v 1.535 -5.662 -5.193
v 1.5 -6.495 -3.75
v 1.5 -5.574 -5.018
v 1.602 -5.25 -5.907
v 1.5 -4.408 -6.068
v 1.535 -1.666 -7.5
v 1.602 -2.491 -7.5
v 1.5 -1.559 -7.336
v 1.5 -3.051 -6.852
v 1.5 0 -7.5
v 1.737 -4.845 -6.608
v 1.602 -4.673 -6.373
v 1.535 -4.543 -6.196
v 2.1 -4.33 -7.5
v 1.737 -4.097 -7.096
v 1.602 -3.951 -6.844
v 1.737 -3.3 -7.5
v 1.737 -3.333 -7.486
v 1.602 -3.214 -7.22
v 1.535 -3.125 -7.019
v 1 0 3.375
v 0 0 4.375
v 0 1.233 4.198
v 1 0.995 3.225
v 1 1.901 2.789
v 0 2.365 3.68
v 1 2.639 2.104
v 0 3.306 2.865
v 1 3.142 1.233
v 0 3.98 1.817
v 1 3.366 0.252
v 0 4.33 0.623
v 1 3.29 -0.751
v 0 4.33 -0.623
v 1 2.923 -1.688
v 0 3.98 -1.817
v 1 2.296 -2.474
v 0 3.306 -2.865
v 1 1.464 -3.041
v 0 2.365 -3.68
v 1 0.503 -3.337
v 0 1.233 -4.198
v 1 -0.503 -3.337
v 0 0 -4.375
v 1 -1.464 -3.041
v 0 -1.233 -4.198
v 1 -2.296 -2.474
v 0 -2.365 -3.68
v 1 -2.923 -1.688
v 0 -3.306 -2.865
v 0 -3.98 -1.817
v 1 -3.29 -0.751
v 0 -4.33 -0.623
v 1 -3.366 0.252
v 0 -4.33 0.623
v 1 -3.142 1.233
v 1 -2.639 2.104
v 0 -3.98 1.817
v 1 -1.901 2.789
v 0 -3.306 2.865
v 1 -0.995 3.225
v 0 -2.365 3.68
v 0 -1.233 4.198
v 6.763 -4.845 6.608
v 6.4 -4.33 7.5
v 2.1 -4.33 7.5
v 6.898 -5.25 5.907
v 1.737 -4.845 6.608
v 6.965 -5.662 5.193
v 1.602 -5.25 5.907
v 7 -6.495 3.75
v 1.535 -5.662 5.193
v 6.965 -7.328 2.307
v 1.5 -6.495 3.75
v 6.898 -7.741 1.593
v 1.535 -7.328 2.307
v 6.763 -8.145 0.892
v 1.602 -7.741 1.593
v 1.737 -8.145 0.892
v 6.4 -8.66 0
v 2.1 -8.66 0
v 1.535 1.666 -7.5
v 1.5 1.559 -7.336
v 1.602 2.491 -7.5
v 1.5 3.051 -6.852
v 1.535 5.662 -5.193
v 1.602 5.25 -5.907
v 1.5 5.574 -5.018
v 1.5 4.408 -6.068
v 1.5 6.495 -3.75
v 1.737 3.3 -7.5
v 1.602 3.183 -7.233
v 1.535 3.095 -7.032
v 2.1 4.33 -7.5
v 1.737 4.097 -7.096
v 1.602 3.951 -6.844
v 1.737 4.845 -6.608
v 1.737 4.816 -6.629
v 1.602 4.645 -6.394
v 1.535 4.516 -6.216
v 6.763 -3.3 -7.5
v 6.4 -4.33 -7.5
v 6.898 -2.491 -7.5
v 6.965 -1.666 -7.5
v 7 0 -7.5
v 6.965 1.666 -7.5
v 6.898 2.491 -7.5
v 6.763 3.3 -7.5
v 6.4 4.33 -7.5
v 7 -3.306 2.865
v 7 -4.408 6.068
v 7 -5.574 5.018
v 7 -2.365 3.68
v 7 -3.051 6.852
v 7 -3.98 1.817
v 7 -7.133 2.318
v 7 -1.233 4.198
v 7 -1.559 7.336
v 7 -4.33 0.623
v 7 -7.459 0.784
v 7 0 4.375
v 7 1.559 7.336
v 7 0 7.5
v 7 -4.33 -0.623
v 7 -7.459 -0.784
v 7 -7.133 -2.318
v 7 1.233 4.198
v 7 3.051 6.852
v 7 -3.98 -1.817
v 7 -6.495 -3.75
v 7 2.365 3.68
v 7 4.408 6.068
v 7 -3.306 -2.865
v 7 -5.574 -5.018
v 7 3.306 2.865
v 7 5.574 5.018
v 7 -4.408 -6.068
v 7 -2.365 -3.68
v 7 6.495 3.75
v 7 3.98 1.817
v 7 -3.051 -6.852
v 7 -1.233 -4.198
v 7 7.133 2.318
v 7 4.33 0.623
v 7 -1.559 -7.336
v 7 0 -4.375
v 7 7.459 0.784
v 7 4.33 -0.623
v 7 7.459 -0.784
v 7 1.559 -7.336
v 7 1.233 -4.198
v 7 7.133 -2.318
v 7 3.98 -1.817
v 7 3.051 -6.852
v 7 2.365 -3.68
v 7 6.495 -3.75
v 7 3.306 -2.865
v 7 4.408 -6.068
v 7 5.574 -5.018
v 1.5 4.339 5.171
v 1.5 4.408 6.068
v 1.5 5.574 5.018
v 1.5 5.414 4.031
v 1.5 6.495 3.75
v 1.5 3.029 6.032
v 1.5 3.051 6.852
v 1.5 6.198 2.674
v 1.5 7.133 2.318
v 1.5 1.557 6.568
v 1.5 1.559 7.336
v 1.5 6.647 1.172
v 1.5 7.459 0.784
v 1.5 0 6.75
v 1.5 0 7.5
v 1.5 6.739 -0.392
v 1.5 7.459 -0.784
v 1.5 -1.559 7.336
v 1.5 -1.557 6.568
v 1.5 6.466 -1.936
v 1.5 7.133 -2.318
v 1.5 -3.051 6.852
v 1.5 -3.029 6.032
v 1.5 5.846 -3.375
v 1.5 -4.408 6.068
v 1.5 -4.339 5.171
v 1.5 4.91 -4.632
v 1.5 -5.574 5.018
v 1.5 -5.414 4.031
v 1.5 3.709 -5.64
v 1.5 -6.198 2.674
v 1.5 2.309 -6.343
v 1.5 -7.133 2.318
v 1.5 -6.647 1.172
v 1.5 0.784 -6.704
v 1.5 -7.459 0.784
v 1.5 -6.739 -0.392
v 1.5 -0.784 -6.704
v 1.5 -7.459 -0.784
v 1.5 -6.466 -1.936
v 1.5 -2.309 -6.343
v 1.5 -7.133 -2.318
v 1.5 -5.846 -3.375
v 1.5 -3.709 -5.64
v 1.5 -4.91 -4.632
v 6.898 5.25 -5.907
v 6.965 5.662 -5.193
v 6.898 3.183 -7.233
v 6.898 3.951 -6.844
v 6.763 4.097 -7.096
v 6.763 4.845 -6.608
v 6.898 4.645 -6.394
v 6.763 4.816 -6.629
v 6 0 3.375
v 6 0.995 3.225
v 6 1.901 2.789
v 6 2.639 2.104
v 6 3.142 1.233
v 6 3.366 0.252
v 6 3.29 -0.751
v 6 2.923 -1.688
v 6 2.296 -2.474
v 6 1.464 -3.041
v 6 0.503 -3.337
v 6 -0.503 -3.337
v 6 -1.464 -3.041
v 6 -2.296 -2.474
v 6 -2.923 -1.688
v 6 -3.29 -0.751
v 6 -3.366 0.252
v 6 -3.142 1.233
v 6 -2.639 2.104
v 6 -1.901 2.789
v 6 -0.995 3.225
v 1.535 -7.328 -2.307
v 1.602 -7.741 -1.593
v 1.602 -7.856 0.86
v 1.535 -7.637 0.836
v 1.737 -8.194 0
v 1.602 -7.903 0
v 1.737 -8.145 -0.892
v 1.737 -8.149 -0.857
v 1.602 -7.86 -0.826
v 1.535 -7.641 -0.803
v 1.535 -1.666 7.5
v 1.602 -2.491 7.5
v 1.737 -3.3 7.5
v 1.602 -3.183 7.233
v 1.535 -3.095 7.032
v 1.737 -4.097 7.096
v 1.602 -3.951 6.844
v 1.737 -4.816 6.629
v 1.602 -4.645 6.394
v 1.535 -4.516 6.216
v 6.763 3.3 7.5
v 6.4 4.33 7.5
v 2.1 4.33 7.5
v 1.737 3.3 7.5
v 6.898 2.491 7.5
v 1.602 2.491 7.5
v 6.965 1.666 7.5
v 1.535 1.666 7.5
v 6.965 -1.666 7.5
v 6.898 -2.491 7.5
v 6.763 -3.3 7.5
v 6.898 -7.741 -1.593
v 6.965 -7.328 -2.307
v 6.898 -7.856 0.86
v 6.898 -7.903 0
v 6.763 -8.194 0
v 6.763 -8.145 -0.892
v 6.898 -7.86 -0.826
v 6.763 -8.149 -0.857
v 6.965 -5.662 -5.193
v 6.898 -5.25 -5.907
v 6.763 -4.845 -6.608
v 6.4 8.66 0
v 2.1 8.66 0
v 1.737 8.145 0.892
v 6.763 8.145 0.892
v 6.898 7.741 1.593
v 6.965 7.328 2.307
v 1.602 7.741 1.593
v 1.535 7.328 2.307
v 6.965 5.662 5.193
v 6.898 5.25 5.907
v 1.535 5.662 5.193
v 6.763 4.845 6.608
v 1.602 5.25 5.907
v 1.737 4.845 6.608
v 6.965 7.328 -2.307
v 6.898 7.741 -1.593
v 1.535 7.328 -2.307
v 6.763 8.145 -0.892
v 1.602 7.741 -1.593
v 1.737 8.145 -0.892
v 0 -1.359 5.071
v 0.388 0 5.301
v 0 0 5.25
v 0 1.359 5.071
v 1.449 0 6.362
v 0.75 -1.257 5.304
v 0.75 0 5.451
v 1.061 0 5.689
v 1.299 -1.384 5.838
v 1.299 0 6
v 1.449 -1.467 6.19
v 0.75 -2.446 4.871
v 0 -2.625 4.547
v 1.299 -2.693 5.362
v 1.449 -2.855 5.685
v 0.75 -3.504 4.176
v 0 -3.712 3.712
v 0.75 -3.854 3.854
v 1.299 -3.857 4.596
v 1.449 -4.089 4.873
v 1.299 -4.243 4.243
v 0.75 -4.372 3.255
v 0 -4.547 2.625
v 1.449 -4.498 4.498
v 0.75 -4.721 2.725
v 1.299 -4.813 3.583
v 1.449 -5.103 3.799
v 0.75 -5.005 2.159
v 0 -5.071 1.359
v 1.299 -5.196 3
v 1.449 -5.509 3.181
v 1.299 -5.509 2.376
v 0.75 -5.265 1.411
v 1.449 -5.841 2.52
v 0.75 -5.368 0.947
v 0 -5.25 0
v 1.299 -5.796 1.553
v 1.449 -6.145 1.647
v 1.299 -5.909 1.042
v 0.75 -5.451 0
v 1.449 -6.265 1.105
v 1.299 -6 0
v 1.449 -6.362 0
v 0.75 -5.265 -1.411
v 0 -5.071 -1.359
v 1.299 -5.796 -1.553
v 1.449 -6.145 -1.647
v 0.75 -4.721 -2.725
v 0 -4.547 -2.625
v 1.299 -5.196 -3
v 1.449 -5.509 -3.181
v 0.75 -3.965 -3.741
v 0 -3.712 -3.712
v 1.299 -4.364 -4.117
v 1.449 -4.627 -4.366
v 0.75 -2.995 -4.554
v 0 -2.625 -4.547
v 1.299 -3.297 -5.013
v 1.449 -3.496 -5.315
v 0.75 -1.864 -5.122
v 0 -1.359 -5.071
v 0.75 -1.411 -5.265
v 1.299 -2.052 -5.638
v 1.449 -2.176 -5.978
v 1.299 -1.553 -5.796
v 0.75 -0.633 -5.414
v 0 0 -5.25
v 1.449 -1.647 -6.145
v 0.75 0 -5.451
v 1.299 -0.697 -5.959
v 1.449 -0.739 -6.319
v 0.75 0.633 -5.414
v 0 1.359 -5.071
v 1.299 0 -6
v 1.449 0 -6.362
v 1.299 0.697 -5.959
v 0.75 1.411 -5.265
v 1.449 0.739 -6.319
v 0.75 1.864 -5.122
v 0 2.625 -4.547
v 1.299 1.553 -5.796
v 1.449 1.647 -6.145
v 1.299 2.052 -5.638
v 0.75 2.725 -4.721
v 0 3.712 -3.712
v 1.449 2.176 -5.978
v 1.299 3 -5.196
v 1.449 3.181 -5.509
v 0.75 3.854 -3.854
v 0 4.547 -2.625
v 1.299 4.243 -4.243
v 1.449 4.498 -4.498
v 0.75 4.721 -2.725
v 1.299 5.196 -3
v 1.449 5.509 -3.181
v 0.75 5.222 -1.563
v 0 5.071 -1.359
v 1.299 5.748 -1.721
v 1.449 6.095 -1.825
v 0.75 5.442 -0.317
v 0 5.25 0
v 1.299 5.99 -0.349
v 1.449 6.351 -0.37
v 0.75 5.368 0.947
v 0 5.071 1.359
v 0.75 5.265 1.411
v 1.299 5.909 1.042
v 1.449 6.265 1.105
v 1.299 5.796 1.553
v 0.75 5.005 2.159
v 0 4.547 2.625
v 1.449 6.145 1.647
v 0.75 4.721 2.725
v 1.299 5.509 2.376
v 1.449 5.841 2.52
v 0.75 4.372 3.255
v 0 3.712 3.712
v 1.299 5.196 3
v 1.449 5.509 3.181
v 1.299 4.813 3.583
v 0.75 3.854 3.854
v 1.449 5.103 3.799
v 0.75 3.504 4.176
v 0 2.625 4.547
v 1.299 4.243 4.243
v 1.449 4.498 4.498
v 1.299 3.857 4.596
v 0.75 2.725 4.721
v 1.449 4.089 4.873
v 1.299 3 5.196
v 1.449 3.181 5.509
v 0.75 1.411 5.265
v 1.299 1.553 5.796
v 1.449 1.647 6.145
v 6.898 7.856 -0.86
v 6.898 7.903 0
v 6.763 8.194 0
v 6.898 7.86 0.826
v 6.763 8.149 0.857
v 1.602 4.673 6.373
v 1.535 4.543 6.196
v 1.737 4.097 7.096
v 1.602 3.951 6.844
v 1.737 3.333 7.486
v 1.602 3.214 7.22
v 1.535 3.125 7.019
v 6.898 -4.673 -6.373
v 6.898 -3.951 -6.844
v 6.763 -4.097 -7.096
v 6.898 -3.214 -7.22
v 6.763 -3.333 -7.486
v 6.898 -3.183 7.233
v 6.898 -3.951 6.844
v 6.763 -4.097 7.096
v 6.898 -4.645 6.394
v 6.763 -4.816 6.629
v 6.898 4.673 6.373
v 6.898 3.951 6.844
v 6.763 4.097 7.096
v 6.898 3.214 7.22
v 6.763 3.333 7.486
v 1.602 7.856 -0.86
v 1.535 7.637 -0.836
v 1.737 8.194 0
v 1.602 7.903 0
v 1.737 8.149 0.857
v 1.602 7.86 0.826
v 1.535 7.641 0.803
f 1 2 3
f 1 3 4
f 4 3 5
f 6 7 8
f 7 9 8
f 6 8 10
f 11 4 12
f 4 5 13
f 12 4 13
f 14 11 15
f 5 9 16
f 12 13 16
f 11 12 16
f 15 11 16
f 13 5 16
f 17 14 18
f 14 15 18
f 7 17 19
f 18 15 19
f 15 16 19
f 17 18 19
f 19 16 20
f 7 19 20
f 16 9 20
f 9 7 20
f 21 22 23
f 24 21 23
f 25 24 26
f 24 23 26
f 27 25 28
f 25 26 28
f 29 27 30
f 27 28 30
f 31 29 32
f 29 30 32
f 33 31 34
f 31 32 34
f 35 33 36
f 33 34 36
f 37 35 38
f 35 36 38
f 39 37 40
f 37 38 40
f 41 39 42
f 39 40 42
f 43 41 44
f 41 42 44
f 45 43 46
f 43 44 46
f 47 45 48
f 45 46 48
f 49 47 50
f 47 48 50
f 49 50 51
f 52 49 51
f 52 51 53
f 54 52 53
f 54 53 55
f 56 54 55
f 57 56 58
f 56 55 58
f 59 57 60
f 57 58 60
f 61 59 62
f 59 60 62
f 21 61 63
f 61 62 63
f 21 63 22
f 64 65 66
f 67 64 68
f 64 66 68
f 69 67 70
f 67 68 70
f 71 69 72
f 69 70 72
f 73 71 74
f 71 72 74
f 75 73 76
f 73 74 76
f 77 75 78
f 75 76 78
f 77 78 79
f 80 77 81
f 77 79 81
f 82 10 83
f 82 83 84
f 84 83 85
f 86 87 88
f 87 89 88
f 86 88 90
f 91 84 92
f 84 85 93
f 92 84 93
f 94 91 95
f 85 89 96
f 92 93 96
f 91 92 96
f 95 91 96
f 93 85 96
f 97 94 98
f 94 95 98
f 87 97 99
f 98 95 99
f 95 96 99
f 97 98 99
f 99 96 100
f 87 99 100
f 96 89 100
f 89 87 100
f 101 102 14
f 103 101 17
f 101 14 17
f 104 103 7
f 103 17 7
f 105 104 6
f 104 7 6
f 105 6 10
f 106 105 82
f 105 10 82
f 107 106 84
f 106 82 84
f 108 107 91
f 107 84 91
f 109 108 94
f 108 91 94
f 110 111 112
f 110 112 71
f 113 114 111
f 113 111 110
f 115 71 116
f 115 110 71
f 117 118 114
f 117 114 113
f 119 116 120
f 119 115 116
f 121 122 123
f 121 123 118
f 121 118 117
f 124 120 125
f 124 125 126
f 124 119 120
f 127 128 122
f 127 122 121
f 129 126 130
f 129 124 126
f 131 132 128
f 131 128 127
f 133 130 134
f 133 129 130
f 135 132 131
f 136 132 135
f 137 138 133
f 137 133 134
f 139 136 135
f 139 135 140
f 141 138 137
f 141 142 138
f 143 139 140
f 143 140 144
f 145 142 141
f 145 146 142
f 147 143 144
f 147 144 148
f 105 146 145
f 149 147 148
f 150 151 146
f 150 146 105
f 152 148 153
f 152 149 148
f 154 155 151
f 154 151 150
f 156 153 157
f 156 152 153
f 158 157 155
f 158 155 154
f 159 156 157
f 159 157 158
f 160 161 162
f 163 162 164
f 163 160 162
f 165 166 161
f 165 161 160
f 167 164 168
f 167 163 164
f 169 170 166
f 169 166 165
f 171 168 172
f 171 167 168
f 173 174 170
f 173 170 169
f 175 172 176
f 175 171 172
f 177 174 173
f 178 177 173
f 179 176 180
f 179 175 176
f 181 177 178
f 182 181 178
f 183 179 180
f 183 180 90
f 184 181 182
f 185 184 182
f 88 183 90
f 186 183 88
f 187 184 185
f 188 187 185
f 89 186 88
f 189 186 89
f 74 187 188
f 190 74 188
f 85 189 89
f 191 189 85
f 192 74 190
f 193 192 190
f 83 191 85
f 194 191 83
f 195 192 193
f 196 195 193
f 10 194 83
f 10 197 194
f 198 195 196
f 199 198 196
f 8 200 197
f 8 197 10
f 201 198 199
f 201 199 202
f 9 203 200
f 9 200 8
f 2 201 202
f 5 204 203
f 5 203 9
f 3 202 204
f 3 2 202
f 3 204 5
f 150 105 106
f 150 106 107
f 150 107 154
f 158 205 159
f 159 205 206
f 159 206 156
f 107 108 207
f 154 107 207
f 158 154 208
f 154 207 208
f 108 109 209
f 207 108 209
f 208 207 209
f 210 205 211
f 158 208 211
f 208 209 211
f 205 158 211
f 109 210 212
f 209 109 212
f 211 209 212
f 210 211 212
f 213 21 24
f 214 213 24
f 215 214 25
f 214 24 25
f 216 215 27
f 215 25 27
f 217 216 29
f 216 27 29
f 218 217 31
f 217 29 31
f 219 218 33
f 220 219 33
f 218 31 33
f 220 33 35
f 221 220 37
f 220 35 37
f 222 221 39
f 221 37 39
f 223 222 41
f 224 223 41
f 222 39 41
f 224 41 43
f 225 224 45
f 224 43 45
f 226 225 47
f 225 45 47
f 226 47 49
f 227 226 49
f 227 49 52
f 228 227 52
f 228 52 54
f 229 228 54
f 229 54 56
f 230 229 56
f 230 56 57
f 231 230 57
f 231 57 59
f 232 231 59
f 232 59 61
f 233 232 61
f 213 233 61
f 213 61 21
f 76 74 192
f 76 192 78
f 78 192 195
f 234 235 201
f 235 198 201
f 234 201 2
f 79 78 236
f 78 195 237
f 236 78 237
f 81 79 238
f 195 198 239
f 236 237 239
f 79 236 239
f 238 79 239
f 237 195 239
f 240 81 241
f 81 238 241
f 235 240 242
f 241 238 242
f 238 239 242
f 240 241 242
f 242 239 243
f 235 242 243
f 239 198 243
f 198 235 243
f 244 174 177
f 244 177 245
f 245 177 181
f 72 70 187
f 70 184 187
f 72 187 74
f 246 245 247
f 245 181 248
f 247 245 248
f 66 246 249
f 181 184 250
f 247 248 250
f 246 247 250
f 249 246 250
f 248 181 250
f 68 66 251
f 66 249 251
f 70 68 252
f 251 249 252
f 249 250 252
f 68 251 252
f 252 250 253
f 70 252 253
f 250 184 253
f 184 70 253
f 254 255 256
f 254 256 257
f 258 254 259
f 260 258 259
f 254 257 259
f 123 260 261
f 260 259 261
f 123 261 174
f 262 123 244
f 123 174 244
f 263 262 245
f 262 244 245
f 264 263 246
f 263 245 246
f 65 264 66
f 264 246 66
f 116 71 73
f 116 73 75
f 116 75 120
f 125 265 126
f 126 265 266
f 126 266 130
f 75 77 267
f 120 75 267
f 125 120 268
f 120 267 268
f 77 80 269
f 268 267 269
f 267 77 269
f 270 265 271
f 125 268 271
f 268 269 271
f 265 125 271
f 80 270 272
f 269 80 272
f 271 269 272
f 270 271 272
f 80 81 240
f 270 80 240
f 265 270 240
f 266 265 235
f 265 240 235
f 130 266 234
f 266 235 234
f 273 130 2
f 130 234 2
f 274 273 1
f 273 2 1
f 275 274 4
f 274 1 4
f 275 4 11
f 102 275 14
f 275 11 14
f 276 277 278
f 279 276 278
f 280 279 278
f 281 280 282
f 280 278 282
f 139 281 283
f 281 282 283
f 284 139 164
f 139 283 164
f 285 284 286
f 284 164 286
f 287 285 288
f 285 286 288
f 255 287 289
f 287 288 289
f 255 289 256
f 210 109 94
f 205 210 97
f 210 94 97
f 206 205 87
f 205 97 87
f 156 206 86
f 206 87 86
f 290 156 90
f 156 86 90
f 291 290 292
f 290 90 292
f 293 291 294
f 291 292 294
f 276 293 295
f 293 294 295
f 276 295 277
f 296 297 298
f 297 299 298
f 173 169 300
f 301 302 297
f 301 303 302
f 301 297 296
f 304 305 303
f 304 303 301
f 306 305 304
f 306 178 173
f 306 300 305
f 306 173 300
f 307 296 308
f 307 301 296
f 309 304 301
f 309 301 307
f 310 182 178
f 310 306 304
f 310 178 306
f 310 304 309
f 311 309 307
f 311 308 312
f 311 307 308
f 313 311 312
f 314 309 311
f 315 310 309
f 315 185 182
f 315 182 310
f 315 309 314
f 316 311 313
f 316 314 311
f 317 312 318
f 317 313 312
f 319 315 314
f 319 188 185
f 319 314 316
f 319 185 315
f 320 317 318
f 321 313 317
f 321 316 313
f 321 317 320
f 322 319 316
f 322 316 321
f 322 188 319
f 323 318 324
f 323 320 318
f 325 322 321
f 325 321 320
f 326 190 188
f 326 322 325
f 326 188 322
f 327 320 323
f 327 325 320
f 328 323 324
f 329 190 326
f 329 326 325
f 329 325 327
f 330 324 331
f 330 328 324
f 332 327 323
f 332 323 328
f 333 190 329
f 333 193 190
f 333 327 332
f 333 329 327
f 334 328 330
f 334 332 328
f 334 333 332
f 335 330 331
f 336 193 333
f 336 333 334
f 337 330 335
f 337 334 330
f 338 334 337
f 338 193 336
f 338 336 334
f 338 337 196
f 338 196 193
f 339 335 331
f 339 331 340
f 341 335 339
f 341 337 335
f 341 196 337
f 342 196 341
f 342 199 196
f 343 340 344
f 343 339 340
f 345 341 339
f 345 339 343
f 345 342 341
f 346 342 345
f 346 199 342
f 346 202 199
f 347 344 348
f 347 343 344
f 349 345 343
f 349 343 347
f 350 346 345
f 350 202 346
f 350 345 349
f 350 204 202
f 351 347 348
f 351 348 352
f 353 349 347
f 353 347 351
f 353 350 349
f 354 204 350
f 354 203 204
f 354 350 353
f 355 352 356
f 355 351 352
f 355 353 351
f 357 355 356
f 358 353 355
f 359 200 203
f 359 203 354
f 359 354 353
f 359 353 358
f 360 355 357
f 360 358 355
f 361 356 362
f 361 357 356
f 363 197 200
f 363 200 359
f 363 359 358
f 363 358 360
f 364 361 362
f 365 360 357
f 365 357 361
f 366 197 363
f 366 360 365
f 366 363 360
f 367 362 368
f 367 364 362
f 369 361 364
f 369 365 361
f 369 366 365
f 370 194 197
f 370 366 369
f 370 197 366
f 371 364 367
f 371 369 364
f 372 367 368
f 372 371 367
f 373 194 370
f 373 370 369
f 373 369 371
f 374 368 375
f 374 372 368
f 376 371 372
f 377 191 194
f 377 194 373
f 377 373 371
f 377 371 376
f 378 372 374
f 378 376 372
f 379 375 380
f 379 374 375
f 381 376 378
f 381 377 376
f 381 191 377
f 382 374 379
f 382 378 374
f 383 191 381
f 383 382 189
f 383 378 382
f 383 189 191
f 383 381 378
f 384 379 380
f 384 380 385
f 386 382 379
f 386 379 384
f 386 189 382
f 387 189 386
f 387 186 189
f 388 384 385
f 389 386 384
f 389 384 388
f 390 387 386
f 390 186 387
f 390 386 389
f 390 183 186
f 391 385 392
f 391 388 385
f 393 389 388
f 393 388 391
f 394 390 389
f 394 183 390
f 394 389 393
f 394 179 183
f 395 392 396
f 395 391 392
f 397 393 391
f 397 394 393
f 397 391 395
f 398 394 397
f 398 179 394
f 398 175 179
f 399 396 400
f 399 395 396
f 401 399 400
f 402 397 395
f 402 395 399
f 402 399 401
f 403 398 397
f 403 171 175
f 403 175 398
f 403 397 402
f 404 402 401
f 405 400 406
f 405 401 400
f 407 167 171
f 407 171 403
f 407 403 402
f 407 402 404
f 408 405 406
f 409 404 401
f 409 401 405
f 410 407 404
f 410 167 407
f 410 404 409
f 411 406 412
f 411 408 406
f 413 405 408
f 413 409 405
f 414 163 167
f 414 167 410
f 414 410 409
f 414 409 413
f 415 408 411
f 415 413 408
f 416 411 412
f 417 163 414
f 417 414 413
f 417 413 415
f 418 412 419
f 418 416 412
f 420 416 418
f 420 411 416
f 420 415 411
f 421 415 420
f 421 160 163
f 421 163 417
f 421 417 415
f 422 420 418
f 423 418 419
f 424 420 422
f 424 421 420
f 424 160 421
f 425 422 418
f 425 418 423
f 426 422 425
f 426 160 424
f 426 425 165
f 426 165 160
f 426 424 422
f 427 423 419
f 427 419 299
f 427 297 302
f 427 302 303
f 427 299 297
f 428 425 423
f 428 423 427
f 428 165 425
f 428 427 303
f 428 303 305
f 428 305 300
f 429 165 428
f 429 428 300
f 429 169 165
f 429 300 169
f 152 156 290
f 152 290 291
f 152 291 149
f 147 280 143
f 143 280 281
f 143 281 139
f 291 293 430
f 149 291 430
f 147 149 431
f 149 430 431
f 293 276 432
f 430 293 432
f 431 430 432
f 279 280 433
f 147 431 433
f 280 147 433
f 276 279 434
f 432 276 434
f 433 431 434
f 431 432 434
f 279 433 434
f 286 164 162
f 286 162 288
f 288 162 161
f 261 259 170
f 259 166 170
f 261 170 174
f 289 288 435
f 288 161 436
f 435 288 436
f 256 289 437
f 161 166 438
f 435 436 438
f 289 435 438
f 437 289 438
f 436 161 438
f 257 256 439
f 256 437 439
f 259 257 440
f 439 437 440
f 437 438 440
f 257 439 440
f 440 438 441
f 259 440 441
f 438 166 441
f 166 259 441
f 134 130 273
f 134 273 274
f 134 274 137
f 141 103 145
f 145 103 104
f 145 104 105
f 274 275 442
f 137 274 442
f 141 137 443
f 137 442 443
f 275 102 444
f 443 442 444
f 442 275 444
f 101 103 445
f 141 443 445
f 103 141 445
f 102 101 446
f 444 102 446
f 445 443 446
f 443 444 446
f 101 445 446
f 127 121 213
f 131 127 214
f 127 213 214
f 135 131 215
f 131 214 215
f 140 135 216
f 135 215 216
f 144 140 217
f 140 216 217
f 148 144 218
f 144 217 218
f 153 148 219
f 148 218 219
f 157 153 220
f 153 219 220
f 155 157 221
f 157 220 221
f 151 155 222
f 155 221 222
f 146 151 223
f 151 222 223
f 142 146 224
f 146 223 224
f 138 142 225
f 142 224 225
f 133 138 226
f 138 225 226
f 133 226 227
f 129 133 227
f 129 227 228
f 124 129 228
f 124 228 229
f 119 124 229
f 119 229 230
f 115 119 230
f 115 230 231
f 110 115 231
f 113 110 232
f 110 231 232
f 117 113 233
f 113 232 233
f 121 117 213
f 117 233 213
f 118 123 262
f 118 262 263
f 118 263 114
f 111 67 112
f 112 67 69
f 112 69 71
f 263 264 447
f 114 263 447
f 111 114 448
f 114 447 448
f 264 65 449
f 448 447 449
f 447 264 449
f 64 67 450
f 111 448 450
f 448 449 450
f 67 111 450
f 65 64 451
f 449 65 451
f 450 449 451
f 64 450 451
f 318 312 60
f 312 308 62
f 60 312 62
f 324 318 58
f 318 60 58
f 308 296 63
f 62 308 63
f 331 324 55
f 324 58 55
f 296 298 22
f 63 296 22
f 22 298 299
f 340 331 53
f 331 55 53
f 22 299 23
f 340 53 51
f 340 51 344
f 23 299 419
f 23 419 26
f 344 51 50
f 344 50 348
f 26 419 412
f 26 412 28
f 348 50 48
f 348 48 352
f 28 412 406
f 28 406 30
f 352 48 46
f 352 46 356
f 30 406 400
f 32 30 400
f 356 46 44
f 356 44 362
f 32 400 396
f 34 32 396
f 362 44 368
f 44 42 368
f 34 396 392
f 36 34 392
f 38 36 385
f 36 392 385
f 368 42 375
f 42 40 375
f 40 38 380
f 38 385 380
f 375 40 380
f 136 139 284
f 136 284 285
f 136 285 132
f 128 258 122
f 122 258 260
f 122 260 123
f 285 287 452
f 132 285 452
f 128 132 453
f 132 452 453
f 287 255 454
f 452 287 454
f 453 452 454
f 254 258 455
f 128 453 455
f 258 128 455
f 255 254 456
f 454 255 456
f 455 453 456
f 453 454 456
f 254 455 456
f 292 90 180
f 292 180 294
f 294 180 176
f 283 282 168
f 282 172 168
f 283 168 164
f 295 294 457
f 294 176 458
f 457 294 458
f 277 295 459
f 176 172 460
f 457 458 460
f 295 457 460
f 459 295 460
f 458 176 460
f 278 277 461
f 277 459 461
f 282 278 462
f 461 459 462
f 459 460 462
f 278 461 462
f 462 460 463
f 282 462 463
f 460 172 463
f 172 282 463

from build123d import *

# Parameters (mm, degrees)
EXTRUSION1_DEPTH        = 7
ESQUISSE3_R             = 3.375
ENL_V_MAT_EXTRU_1_DEPTH = 8
CHANFREIN1_SIZE         = 1


with BuildPart() as part:
    # Esquisse1 → Extrusion1 (new body)
    with BuildSketch(Plane(origin=(0, 0, 0), x_dir=(0, 0, -1), z_dir=(1, 0, 0))):
        Polygon((0, 8.660254038), (-7.5, 4.330127019), (-7.5, -4.330127019), (0, -8.660254038), (7.5, -4.330127019), (7.5, 4.330127019), align=None)
    extrude(amount=EXTRUSION1_DEPTH)

    # Esquisse2 → Enlèvement de matière-Révolution1 (revolve, cut)
    with BuildSketch(Plane.XY, mode=Mode.PRIVATE) as enl_vement_de_mati_re_r_volution1_sk:
        with BuildLine():
            Line((1.5, 6.75), (1.5, 8.660254038))
            Line((1.5, 8.660254038), (0, 8.660254038))
            Line((0, 8.660254038), (0, 5.25))
            ThreePointArc((0, 5.25), (1.060660172, 5.689339828), (1.5, 6.75))
        make_face()
    revolve(enl_vement_de_mati_re_r_volution1_sk.sketch.rotate(Axis((-3.040359493, 0, 0), (1, 0, 0)), 90), axis=Axis((-3.040359493, 0, 0), (1, 0, 0)), mode=Mode.SUBTRACT)  # turned: the seam where the file's is

    # Esquisse3 → Enlèv. mat.-Extru.1 (cut, through all)
    with BuildSketch(Plane.ZY):
        Circle(ESQUISSE3_R)
    extrude(amount=-ENL_V_MAT_EXTRU_1_DEPTH, mode=Mode.SUBTRACT)

    # Chanfrein1
    chanfrein1_edges = [part.edges().sort_by_distance(p)[0] for p in [
        (7, 0, -3.375),
        (0, 0, -3.375),
    ]]
    chamfer(chanfrein1_edges, length=CHANFREIN1_SIZE)

    # Esquisse4 → Enlèvement de matière-Révolution2 (revolve, cut)
    with BuildSketch(Plane.XY, mode=Mode.PRIVATE) as enl_vement_de_mati_re_r_volution2_sk:
        with BuildLine():
            Line((1.5, 8.660254038), (2.1, 8.660254038))
            ThreePointArc((2.1, 8.660254038), (1.70260937, 8.130490453), (1.5, 7.5))
            Line((1.5, 7.5), (1.5, 8.660254038))
        make_face()
        with BuildLine():
            Line((7, 8.660254038), (7, 7.5))
            ThreePointArc((7, 7.5), (6.79739063, 8.130490453), (6.4, 8.660254038))
            Line((6.4, 8.660254038), (7, 8.660254038))
        make_face()
    revolve(enl_vement_de_mati_re_r_volution2_sk.sketch.rotate(Axis((0, 0, 0), (1, 0, 0)), 270), axis=Axis((0, 0, 0), (1, 0, 0)), mode=Mode.SUBTRACT)  # turned: the seam where the file's is


solid = part.part
